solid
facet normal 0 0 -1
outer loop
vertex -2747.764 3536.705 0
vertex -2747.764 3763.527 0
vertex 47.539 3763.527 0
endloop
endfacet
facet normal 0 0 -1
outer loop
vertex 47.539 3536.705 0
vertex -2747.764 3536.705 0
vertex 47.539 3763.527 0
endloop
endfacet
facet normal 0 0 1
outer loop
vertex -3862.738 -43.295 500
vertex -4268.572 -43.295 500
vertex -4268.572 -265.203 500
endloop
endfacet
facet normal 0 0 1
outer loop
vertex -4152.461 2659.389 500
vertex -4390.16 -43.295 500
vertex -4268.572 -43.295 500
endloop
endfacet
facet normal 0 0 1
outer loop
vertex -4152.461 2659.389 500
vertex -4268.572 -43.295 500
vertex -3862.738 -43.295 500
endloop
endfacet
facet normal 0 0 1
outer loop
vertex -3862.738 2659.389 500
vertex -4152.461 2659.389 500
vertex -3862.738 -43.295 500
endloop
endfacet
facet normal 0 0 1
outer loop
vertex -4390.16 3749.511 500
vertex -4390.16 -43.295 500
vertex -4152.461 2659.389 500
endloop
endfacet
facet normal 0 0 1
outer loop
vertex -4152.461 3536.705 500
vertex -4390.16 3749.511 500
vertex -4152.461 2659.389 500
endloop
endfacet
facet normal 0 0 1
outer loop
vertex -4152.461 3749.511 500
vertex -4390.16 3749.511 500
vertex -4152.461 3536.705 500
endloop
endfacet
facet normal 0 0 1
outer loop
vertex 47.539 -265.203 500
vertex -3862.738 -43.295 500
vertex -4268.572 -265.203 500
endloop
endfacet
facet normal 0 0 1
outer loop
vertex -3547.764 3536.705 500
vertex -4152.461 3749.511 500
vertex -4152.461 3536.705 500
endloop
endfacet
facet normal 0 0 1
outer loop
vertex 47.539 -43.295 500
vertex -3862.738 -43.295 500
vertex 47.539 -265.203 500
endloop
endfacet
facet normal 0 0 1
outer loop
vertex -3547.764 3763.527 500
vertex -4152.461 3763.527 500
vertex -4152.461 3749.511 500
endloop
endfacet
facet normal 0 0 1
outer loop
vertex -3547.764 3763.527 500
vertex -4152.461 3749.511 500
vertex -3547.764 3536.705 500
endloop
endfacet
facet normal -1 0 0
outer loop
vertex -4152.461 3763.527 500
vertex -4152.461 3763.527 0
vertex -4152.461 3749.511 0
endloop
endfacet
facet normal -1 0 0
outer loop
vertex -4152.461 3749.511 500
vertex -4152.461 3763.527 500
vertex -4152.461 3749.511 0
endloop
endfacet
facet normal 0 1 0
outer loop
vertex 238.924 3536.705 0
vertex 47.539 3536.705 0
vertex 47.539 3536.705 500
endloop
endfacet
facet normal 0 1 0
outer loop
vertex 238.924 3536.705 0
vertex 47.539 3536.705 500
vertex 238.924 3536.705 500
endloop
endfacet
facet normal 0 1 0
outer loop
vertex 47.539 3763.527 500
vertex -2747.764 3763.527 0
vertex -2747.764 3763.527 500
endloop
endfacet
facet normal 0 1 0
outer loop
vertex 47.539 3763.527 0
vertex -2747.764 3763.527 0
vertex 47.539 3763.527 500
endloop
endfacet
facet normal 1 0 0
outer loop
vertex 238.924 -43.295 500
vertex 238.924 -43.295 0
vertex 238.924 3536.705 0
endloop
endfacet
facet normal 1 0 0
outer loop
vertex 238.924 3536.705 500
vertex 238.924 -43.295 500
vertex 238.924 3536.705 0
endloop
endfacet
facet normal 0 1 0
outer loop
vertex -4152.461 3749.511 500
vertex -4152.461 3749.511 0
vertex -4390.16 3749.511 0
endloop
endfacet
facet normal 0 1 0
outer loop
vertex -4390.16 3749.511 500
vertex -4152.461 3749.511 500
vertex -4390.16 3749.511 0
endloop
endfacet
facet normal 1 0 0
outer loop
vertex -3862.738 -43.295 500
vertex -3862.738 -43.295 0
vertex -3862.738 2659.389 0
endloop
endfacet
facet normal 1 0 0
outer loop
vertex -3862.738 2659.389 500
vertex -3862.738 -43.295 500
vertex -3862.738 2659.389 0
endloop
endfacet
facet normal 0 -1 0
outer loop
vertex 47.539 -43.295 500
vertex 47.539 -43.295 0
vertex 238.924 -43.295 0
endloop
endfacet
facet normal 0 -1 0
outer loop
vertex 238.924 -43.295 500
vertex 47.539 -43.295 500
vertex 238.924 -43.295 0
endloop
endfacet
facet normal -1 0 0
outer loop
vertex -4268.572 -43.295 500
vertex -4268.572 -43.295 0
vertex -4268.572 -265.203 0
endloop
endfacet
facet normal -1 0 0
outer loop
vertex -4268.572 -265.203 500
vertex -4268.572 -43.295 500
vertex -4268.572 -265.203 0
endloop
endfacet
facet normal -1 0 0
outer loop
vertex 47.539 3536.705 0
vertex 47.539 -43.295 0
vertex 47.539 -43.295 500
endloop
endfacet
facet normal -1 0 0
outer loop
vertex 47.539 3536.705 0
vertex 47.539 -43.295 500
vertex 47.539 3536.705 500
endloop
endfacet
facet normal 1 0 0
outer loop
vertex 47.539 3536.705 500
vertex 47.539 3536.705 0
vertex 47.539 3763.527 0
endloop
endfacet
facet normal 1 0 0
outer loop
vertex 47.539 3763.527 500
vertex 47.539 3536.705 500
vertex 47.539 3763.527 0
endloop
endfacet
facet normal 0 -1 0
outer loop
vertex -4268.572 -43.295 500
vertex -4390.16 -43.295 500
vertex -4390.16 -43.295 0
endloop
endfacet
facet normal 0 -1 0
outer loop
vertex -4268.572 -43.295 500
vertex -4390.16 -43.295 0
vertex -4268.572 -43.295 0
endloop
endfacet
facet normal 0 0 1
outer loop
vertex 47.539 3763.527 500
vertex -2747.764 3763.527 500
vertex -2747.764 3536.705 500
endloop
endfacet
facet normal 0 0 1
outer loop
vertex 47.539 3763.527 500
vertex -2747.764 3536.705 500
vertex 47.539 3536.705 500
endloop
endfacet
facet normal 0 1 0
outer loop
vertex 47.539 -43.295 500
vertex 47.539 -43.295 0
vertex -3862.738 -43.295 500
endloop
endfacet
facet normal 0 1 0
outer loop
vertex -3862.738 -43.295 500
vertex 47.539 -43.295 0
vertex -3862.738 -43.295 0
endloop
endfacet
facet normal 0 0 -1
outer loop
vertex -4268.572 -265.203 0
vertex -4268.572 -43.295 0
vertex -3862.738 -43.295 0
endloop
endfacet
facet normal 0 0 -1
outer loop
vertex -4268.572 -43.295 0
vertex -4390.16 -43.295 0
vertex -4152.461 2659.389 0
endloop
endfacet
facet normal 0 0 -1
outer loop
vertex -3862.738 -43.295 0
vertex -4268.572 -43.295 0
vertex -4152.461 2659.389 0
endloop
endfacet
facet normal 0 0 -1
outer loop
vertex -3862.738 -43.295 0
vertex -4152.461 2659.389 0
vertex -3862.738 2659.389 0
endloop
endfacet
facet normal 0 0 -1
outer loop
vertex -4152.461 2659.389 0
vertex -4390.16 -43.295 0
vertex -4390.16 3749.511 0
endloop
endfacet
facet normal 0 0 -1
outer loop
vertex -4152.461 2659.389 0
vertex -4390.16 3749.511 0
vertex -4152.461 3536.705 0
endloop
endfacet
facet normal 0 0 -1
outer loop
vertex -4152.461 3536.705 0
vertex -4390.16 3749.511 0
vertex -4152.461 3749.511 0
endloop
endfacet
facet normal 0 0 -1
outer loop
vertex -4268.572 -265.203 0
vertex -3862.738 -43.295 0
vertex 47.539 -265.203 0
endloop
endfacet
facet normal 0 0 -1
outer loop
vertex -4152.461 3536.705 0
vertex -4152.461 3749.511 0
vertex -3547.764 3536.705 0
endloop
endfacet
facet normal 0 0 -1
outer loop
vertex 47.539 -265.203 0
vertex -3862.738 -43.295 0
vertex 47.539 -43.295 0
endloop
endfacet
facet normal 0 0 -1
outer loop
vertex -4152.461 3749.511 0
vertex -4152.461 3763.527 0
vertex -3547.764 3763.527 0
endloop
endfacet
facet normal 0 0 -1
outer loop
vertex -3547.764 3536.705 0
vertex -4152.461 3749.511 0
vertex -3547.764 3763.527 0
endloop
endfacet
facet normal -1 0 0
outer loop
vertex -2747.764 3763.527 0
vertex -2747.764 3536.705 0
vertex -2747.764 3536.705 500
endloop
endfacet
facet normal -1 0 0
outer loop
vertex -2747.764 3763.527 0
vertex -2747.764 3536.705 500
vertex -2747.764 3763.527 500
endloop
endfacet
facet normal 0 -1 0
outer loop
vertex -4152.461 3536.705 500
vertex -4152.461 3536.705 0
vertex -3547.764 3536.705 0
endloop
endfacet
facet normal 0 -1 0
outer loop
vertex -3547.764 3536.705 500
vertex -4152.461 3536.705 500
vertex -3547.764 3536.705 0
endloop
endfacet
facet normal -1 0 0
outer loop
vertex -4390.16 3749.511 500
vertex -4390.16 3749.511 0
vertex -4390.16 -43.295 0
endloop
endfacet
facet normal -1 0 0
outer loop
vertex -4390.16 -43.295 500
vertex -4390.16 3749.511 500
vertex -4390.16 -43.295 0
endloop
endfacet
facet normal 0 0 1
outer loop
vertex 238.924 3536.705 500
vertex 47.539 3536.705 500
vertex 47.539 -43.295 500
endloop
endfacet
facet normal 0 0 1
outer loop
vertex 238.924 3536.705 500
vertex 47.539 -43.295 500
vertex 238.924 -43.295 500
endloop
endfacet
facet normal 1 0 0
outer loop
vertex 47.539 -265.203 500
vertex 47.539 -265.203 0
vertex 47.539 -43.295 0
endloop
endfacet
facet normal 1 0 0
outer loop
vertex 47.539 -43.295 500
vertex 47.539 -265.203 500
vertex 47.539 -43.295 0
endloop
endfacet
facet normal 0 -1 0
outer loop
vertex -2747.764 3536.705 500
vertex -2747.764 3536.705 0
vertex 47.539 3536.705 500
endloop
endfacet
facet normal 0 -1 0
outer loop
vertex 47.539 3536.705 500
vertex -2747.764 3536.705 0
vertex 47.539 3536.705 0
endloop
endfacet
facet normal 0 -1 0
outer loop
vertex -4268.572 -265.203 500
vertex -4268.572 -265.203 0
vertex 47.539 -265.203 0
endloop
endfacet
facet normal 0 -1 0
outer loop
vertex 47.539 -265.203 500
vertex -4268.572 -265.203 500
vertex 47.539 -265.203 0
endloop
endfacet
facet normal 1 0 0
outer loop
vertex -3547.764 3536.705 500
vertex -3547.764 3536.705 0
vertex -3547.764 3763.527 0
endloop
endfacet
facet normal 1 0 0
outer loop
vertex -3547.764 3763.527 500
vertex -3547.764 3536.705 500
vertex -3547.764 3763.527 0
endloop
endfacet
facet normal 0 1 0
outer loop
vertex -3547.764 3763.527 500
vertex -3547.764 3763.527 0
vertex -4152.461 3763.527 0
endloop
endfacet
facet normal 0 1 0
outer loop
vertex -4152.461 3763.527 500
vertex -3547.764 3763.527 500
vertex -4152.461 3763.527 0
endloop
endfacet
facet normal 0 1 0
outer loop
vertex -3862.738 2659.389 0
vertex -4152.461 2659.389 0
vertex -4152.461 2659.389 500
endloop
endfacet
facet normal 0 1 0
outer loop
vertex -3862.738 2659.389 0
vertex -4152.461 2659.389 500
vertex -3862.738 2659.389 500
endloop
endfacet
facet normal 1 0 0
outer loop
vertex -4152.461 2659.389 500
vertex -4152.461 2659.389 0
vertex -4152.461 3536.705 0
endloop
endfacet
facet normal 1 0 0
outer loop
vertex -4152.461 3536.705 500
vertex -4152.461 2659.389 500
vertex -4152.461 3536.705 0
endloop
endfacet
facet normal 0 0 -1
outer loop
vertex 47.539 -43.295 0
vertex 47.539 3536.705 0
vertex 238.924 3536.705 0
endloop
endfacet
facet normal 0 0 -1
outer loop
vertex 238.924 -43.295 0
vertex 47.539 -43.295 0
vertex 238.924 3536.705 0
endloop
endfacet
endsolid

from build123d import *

# Parameters (mm, degrees)
F0_W     = 191.385146
F0_H     = 3580
F0_W_2   = 2795.303167
F0_H_2   = 226.821689
F0_W_3   = 289.722764
F0_H_3   = 2702.683553
F1_DEPTH = 500


with BuildPart() as f1:
    # F0 (on Top) → F1 (new body)
    with BuildSketch(Plane.XY):
        with Locations((143.231677, 1746.705466)):
            Rectangle(F0_W, F0_H)
        with Locations((-1350.11248, 3650.11631)):
            Rectangle(F0_W_2, F0_H_2)
        Polygon((-4152.460896, 3749.511003), (-4152.460896, 3536.705466), (-3640.583038, 3536.705466), (-3547.764063, 3536.705466), (-3547.764063, 3763.527155), (-4152.460896, 3763.527155), align=None)
        Polygon((-3862.738132, -43.294534), (-4152.460896, -43.294534), (-4268.571854, -43.294534), (-4268.571854, -265.20282), (47.539104, -265.20282), (47.539104, -43.294534), align=None)
        Polygon((-4152.460896, 2659.389019), (-4152.460896, 3536.705466), (-4152.460896, 3749.511003), (-4390.160084, 3749.511003), (-4390.160084, -43.294534), (-4268.571854, -43.294534), (-4152.460896, -43.294534), align=None)
        with Locations((-4007.599514, 1308.047242)):
            Rectangle(F0_W_3, F0_H_3)
    extrude(amount=F1_DEPTH)


solid = f1.part
